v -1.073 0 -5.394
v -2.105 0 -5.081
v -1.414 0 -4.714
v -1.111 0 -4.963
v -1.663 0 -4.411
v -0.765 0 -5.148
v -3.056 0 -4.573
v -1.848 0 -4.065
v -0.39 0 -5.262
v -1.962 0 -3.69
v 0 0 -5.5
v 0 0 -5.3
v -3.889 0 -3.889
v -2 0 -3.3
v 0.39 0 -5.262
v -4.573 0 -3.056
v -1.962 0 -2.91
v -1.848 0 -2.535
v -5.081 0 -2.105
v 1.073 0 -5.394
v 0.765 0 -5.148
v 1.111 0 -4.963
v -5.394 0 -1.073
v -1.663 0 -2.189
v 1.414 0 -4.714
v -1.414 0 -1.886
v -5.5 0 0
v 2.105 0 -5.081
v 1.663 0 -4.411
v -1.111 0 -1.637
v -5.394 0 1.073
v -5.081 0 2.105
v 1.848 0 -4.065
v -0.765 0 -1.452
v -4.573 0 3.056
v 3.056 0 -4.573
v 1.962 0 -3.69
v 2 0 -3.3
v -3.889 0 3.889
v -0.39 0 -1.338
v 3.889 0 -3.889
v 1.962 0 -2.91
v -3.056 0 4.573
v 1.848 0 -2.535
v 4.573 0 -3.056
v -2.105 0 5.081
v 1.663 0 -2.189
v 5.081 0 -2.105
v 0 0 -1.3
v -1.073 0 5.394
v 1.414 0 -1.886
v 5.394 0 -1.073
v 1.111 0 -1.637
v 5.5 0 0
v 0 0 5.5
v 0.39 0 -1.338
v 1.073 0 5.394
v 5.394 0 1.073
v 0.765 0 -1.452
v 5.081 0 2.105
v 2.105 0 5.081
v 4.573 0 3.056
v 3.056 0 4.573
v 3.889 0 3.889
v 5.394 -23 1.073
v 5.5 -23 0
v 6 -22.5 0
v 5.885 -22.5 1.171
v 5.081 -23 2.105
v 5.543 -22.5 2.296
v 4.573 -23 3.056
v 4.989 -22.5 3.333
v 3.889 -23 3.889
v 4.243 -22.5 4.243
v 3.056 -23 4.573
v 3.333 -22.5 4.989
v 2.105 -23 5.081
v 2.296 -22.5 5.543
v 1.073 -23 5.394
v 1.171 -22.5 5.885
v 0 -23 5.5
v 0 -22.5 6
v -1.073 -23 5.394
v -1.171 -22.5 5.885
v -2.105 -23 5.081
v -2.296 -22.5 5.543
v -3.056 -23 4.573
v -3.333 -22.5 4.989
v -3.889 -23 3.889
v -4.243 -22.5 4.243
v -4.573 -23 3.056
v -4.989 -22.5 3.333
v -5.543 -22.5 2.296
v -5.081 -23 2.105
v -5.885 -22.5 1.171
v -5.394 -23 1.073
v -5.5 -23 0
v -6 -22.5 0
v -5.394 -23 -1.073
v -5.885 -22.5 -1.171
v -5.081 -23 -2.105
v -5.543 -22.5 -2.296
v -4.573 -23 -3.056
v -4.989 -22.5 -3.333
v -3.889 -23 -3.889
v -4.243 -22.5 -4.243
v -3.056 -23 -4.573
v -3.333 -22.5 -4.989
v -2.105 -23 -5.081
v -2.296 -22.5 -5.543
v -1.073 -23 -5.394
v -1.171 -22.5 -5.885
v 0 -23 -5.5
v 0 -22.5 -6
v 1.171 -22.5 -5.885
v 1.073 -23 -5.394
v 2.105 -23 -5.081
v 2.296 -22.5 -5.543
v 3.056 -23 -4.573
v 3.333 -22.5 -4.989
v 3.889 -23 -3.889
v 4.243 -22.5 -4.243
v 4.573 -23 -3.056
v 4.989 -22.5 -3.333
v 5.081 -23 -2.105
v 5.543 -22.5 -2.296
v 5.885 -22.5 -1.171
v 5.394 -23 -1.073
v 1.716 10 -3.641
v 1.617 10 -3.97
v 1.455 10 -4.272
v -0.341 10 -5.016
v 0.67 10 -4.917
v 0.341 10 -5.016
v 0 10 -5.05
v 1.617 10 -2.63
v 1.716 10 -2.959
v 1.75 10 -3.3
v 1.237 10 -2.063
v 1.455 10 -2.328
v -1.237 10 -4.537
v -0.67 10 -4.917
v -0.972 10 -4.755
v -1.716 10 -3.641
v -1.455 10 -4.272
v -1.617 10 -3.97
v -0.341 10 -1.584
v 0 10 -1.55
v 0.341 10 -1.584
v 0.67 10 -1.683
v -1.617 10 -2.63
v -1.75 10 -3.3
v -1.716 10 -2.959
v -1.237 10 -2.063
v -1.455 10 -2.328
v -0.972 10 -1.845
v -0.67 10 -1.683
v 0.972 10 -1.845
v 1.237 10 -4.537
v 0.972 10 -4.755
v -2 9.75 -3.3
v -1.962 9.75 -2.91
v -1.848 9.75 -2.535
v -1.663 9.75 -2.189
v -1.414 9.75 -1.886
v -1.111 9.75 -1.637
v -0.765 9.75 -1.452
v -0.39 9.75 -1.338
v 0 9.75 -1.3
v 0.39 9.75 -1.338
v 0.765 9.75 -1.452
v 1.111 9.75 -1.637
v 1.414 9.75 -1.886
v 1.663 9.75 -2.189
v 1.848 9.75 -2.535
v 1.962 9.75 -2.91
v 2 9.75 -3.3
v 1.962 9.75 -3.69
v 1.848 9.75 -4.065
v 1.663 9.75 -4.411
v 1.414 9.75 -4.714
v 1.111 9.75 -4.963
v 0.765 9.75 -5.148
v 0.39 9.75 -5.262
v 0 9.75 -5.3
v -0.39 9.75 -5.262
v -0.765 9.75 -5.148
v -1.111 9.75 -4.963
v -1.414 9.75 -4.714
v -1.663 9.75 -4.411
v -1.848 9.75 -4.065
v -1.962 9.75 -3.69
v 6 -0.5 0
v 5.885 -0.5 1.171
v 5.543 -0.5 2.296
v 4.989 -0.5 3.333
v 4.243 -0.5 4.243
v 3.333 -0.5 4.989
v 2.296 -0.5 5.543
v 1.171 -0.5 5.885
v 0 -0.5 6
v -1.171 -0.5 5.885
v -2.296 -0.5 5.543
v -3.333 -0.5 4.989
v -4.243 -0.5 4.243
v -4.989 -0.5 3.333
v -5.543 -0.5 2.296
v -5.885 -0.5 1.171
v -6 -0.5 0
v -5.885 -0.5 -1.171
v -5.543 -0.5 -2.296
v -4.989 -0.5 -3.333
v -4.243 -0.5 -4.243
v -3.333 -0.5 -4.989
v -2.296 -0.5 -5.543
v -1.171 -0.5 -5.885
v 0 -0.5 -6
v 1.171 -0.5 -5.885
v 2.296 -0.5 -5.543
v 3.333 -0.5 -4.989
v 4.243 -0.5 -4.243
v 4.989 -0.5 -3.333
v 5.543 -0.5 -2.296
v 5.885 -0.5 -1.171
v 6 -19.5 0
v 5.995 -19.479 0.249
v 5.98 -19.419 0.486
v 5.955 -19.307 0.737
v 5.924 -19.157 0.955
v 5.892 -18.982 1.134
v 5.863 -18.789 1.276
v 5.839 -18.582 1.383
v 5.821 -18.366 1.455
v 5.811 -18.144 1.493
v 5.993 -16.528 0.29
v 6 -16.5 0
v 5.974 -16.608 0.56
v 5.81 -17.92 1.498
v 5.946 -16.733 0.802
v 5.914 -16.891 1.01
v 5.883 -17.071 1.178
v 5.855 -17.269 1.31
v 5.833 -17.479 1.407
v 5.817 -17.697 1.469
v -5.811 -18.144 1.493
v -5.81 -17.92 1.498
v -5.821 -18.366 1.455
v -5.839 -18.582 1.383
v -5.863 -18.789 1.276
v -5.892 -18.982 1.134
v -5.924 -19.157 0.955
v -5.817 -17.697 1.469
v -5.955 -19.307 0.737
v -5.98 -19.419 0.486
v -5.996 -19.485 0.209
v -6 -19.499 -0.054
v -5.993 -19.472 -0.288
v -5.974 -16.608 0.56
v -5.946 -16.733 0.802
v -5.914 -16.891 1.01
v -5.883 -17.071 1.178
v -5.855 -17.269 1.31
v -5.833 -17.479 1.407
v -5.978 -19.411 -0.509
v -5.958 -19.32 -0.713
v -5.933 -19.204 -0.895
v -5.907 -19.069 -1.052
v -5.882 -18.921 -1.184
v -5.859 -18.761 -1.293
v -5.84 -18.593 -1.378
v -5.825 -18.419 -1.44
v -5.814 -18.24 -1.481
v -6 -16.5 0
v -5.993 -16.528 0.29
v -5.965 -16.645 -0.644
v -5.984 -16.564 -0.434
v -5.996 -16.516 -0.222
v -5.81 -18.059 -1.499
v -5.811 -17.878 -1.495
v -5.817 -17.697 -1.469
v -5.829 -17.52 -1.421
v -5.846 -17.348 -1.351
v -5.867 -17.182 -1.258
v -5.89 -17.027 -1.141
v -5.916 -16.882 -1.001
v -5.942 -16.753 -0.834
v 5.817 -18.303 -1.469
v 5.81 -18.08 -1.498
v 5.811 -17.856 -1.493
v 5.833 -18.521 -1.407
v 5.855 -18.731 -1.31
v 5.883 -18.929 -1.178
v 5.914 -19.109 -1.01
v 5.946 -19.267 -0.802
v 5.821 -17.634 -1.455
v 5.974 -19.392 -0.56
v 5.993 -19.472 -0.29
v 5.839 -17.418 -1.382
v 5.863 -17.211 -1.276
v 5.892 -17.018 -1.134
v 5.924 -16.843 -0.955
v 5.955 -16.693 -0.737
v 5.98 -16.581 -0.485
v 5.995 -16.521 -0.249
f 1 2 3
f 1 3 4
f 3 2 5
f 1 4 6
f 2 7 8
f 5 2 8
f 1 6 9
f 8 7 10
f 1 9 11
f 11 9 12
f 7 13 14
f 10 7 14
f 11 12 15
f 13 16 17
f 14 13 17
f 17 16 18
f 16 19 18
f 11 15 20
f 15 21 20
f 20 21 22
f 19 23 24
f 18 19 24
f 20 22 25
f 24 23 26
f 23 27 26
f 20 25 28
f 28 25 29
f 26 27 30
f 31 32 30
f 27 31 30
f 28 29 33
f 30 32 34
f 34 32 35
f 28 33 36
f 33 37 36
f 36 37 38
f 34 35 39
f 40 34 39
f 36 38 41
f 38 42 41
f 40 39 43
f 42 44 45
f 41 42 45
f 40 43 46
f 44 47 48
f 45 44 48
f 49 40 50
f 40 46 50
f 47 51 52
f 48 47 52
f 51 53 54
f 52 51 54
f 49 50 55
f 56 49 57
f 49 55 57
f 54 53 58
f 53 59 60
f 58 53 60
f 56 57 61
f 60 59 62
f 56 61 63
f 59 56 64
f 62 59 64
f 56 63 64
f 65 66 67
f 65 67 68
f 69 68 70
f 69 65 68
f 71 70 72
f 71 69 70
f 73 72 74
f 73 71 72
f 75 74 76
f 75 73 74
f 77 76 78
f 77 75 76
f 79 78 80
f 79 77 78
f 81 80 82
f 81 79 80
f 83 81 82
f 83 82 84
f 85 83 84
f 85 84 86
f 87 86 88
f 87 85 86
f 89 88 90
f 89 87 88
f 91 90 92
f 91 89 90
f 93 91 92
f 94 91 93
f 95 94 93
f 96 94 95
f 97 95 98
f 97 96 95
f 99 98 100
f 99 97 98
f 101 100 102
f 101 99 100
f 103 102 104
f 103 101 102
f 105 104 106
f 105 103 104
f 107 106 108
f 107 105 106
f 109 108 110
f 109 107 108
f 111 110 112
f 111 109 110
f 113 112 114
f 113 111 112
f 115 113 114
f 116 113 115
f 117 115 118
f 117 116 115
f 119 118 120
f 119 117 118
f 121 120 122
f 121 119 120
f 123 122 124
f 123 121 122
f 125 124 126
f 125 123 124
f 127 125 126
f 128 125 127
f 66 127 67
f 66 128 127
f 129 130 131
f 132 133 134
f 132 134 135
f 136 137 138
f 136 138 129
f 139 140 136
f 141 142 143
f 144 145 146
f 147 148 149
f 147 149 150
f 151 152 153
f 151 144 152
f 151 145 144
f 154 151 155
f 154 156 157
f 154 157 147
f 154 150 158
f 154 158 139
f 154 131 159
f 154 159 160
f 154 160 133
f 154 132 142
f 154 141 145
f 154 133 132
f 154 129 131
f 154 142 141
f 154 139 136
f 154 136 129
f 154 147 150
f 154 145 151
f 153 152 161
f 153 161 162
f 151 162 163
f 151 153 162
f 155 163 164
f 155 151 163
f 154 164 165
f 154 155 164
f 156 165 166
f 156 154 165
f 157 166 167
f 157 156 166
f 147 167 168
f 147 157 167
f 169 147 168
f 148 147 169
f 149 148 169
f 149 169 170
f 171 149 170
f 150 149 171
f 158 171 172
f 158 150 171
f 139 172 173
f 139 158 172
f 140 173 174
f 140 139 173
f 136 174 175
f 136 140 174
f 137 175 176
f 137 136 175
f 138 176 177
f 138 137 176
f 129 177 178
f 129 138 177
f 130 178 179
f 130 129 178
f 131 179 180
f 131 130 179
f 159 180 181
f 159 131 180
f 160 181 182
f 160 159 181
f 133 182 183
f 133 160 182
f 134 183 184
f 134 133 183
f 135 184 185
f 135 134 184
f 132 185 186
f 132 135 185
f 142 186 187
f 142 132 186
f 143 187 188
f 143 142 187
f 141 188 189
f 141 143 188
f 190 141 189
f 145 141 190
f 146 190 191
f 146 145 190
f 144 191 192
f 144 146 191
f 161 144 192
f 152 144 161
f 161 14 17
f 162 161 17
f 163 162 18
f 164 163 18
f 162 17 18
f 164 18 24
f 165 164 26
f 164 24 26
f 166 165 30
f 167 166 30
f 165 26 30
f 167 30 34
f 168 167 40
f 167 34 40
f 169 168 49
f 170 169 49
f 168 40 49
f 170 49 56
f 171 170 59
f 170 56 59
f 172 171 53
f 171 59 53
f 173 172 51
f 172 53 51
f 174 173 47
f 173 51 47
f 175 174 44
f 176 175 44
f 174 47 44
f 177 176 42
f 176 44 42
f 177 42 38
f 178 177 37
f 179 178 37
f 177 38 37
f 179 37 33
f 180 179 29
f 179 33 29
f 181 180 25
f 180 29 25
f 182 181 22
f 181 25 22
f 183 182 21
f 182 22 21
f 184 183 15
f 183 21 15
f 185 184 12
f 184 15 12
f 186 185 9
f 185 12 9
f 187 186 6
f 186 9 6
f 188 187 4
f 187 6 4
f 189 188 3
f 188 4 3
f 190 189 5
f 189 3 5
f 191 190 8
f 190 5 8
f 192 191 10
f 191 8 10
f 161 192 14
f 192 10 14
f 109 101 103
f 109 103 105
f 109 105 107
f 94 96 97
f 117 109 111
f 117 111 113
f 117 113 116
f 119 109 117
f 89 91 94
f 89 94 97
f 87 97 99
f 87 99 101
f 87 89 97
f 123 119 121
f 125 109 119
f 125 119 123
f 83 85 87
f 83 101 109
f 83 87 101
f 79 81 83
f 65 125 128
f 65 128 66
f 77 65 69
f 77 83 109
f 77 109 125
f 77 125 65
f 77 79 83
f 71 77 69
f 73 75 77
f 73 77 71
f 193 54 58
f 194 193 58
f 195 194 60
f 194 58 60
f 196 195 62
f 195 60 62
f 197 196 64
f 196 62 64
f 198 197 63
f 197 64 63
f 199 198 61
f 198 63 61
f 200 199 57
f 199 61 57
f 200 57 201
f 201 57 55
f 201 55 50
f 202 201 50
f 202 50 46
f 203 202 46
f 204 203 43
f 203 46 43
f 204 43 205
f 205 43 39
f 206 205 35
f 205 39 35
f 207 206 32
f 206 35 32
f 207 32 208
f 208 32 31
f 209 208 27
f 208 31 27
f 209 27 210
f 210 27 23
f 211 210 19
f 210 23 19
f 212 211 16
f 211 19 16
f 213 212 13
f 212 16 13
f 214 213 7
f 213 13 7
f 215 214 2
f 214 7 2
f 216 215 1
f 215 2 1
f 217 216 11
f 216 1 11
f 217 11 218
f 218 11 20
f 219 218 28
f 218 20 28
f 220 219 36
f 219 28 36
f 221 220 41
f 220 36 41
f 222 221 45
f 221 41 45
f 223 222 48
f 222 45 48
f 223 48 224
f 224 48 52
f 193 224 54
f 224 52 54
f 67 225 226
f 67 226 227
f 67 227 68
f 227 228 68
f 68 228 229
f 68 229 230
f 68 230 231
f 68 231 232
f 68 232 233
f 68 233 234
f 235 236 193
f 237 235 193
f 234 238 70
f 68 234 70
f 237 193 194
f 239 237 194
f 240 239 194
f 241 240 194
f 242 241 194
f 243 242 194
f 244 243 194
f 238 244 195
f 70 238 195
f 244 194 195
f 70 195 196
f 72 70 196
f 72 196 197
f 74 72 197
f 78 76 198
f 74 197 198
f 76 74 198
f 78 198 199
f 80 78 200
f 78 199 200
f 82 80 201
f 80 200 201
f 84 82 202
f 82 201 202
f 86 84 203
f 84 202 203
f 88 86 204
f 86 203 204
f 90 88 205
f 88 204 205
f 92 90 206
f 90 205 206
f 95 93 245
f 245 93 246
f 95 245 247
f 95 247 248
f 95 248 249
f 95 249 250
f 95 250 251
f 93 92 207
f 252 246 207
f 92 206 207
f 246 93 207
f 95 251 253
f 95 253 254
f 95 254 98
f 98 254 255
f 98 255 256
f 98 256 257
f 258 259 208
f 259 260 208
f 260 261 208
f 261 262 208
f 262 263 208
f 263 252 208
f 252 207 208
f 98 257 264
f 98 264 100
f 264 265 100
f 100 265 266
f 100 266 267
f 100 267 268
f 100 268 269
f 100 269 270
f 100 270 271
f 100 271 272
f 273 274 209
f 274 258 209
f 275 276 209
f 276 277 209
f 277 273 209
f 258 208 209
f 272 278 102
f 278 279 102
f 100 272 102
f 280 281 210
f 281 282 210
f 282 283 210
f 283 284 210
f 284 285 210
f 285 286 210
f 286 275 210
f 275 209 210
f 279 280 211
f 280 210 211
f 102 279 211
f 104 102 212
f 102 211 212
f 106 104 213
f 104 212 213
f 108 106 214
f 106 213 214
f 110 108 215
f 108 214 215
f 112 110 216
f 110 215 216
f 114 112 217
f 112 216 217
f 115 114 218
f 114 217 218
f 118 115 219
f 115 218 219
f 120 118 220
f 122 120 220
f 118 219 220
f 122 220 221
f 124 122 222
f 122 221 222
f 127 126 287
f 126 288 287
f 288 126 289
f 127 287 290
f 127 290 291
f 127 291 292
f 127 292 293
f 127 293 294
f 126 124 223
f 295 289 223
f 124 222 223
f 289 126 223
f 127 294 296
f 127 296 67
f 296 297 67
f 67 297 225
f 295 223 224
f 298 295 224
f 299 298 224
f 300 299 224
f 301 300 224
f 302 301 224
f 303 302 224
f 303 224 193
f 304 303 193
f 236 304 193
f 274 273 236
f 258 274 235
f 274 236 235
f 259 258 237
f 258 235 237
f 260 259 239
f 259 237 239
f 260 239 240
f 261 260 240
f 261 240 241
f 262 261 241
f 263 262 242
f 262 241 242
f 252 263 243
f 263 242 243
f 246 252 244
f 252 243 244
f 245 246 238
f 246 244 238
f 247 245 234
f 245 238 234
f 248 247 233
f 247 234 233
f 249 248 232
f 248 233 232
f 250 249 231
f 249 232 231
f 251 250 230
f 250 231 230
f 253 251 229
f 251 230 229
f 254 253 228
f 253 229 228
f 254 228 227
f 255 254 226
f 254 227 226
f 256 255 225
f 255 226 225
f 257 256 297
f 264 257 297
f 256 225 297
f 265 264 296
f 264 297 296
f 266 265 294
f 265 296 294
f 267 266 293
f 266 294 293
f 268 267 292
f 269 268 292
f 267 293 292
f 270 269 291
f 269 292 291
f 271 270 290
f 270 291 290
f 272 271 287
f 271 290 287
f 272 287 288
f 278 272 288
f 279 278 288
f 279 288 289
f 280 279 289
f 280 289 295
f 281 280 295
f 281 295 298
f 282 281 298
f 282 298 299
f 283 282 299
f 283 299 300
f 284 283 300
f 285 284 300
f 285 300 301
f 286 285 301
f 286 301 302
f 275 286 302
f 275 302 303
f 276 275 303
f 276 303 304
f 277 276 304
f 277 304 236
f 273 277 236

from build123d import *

# Parameters (mm, degrees)
F0_R     = 6
F1_DEPTH = 23
F2_SIZE  = 0.5
F3_R     = 1.5
F4_DEPTH = 12.5
F5_R     = 2
F6_DEPTH = 10
F7_SIZE  = 0.25


with BuildPart() as f1:
    # F0 (on Front) → F1 (new body)
    with BuildSketch(Plane.XZ):
        Circle(F0_R)
    extrude(amount=F1_DEPTH)

    # F2
    f2_edges = [f1.edges().sort_by_distance(p)[0] for p in [
        (-6, -23, 0),
        (-6, 0, 0),
    ]]
    chamfer(f2_edges, length=F2_SIZE)

    # F3 (on Right) → F4 (cut, symmetric)
    with BuildSketch(Plane.YZ):
        with Locations((-18, 0)):
            Circle(F3_R)
    extrude(amount=F4_DEPTH, both=True, mode=Mode.SUBTRACT)

    # F5 (on face) → F6 (join)
    with BuildSketch(Plane(origin=(0, 0, 0), x_dir=(-1, 0, 0), z_dir=(0, 1, 0))):
        with Locations((0, -3.3)):
            Circle(F5_R)
    extrude(amount=F6_DEPTH)

    # F7
    f7_edges = [f1.edges().sort_by_distance(p)[0] for p in [
        (2, 10, -3.3),
    ]]
    chamfer(f7_edges, length=F7_SIZE)


solid = f1.part
